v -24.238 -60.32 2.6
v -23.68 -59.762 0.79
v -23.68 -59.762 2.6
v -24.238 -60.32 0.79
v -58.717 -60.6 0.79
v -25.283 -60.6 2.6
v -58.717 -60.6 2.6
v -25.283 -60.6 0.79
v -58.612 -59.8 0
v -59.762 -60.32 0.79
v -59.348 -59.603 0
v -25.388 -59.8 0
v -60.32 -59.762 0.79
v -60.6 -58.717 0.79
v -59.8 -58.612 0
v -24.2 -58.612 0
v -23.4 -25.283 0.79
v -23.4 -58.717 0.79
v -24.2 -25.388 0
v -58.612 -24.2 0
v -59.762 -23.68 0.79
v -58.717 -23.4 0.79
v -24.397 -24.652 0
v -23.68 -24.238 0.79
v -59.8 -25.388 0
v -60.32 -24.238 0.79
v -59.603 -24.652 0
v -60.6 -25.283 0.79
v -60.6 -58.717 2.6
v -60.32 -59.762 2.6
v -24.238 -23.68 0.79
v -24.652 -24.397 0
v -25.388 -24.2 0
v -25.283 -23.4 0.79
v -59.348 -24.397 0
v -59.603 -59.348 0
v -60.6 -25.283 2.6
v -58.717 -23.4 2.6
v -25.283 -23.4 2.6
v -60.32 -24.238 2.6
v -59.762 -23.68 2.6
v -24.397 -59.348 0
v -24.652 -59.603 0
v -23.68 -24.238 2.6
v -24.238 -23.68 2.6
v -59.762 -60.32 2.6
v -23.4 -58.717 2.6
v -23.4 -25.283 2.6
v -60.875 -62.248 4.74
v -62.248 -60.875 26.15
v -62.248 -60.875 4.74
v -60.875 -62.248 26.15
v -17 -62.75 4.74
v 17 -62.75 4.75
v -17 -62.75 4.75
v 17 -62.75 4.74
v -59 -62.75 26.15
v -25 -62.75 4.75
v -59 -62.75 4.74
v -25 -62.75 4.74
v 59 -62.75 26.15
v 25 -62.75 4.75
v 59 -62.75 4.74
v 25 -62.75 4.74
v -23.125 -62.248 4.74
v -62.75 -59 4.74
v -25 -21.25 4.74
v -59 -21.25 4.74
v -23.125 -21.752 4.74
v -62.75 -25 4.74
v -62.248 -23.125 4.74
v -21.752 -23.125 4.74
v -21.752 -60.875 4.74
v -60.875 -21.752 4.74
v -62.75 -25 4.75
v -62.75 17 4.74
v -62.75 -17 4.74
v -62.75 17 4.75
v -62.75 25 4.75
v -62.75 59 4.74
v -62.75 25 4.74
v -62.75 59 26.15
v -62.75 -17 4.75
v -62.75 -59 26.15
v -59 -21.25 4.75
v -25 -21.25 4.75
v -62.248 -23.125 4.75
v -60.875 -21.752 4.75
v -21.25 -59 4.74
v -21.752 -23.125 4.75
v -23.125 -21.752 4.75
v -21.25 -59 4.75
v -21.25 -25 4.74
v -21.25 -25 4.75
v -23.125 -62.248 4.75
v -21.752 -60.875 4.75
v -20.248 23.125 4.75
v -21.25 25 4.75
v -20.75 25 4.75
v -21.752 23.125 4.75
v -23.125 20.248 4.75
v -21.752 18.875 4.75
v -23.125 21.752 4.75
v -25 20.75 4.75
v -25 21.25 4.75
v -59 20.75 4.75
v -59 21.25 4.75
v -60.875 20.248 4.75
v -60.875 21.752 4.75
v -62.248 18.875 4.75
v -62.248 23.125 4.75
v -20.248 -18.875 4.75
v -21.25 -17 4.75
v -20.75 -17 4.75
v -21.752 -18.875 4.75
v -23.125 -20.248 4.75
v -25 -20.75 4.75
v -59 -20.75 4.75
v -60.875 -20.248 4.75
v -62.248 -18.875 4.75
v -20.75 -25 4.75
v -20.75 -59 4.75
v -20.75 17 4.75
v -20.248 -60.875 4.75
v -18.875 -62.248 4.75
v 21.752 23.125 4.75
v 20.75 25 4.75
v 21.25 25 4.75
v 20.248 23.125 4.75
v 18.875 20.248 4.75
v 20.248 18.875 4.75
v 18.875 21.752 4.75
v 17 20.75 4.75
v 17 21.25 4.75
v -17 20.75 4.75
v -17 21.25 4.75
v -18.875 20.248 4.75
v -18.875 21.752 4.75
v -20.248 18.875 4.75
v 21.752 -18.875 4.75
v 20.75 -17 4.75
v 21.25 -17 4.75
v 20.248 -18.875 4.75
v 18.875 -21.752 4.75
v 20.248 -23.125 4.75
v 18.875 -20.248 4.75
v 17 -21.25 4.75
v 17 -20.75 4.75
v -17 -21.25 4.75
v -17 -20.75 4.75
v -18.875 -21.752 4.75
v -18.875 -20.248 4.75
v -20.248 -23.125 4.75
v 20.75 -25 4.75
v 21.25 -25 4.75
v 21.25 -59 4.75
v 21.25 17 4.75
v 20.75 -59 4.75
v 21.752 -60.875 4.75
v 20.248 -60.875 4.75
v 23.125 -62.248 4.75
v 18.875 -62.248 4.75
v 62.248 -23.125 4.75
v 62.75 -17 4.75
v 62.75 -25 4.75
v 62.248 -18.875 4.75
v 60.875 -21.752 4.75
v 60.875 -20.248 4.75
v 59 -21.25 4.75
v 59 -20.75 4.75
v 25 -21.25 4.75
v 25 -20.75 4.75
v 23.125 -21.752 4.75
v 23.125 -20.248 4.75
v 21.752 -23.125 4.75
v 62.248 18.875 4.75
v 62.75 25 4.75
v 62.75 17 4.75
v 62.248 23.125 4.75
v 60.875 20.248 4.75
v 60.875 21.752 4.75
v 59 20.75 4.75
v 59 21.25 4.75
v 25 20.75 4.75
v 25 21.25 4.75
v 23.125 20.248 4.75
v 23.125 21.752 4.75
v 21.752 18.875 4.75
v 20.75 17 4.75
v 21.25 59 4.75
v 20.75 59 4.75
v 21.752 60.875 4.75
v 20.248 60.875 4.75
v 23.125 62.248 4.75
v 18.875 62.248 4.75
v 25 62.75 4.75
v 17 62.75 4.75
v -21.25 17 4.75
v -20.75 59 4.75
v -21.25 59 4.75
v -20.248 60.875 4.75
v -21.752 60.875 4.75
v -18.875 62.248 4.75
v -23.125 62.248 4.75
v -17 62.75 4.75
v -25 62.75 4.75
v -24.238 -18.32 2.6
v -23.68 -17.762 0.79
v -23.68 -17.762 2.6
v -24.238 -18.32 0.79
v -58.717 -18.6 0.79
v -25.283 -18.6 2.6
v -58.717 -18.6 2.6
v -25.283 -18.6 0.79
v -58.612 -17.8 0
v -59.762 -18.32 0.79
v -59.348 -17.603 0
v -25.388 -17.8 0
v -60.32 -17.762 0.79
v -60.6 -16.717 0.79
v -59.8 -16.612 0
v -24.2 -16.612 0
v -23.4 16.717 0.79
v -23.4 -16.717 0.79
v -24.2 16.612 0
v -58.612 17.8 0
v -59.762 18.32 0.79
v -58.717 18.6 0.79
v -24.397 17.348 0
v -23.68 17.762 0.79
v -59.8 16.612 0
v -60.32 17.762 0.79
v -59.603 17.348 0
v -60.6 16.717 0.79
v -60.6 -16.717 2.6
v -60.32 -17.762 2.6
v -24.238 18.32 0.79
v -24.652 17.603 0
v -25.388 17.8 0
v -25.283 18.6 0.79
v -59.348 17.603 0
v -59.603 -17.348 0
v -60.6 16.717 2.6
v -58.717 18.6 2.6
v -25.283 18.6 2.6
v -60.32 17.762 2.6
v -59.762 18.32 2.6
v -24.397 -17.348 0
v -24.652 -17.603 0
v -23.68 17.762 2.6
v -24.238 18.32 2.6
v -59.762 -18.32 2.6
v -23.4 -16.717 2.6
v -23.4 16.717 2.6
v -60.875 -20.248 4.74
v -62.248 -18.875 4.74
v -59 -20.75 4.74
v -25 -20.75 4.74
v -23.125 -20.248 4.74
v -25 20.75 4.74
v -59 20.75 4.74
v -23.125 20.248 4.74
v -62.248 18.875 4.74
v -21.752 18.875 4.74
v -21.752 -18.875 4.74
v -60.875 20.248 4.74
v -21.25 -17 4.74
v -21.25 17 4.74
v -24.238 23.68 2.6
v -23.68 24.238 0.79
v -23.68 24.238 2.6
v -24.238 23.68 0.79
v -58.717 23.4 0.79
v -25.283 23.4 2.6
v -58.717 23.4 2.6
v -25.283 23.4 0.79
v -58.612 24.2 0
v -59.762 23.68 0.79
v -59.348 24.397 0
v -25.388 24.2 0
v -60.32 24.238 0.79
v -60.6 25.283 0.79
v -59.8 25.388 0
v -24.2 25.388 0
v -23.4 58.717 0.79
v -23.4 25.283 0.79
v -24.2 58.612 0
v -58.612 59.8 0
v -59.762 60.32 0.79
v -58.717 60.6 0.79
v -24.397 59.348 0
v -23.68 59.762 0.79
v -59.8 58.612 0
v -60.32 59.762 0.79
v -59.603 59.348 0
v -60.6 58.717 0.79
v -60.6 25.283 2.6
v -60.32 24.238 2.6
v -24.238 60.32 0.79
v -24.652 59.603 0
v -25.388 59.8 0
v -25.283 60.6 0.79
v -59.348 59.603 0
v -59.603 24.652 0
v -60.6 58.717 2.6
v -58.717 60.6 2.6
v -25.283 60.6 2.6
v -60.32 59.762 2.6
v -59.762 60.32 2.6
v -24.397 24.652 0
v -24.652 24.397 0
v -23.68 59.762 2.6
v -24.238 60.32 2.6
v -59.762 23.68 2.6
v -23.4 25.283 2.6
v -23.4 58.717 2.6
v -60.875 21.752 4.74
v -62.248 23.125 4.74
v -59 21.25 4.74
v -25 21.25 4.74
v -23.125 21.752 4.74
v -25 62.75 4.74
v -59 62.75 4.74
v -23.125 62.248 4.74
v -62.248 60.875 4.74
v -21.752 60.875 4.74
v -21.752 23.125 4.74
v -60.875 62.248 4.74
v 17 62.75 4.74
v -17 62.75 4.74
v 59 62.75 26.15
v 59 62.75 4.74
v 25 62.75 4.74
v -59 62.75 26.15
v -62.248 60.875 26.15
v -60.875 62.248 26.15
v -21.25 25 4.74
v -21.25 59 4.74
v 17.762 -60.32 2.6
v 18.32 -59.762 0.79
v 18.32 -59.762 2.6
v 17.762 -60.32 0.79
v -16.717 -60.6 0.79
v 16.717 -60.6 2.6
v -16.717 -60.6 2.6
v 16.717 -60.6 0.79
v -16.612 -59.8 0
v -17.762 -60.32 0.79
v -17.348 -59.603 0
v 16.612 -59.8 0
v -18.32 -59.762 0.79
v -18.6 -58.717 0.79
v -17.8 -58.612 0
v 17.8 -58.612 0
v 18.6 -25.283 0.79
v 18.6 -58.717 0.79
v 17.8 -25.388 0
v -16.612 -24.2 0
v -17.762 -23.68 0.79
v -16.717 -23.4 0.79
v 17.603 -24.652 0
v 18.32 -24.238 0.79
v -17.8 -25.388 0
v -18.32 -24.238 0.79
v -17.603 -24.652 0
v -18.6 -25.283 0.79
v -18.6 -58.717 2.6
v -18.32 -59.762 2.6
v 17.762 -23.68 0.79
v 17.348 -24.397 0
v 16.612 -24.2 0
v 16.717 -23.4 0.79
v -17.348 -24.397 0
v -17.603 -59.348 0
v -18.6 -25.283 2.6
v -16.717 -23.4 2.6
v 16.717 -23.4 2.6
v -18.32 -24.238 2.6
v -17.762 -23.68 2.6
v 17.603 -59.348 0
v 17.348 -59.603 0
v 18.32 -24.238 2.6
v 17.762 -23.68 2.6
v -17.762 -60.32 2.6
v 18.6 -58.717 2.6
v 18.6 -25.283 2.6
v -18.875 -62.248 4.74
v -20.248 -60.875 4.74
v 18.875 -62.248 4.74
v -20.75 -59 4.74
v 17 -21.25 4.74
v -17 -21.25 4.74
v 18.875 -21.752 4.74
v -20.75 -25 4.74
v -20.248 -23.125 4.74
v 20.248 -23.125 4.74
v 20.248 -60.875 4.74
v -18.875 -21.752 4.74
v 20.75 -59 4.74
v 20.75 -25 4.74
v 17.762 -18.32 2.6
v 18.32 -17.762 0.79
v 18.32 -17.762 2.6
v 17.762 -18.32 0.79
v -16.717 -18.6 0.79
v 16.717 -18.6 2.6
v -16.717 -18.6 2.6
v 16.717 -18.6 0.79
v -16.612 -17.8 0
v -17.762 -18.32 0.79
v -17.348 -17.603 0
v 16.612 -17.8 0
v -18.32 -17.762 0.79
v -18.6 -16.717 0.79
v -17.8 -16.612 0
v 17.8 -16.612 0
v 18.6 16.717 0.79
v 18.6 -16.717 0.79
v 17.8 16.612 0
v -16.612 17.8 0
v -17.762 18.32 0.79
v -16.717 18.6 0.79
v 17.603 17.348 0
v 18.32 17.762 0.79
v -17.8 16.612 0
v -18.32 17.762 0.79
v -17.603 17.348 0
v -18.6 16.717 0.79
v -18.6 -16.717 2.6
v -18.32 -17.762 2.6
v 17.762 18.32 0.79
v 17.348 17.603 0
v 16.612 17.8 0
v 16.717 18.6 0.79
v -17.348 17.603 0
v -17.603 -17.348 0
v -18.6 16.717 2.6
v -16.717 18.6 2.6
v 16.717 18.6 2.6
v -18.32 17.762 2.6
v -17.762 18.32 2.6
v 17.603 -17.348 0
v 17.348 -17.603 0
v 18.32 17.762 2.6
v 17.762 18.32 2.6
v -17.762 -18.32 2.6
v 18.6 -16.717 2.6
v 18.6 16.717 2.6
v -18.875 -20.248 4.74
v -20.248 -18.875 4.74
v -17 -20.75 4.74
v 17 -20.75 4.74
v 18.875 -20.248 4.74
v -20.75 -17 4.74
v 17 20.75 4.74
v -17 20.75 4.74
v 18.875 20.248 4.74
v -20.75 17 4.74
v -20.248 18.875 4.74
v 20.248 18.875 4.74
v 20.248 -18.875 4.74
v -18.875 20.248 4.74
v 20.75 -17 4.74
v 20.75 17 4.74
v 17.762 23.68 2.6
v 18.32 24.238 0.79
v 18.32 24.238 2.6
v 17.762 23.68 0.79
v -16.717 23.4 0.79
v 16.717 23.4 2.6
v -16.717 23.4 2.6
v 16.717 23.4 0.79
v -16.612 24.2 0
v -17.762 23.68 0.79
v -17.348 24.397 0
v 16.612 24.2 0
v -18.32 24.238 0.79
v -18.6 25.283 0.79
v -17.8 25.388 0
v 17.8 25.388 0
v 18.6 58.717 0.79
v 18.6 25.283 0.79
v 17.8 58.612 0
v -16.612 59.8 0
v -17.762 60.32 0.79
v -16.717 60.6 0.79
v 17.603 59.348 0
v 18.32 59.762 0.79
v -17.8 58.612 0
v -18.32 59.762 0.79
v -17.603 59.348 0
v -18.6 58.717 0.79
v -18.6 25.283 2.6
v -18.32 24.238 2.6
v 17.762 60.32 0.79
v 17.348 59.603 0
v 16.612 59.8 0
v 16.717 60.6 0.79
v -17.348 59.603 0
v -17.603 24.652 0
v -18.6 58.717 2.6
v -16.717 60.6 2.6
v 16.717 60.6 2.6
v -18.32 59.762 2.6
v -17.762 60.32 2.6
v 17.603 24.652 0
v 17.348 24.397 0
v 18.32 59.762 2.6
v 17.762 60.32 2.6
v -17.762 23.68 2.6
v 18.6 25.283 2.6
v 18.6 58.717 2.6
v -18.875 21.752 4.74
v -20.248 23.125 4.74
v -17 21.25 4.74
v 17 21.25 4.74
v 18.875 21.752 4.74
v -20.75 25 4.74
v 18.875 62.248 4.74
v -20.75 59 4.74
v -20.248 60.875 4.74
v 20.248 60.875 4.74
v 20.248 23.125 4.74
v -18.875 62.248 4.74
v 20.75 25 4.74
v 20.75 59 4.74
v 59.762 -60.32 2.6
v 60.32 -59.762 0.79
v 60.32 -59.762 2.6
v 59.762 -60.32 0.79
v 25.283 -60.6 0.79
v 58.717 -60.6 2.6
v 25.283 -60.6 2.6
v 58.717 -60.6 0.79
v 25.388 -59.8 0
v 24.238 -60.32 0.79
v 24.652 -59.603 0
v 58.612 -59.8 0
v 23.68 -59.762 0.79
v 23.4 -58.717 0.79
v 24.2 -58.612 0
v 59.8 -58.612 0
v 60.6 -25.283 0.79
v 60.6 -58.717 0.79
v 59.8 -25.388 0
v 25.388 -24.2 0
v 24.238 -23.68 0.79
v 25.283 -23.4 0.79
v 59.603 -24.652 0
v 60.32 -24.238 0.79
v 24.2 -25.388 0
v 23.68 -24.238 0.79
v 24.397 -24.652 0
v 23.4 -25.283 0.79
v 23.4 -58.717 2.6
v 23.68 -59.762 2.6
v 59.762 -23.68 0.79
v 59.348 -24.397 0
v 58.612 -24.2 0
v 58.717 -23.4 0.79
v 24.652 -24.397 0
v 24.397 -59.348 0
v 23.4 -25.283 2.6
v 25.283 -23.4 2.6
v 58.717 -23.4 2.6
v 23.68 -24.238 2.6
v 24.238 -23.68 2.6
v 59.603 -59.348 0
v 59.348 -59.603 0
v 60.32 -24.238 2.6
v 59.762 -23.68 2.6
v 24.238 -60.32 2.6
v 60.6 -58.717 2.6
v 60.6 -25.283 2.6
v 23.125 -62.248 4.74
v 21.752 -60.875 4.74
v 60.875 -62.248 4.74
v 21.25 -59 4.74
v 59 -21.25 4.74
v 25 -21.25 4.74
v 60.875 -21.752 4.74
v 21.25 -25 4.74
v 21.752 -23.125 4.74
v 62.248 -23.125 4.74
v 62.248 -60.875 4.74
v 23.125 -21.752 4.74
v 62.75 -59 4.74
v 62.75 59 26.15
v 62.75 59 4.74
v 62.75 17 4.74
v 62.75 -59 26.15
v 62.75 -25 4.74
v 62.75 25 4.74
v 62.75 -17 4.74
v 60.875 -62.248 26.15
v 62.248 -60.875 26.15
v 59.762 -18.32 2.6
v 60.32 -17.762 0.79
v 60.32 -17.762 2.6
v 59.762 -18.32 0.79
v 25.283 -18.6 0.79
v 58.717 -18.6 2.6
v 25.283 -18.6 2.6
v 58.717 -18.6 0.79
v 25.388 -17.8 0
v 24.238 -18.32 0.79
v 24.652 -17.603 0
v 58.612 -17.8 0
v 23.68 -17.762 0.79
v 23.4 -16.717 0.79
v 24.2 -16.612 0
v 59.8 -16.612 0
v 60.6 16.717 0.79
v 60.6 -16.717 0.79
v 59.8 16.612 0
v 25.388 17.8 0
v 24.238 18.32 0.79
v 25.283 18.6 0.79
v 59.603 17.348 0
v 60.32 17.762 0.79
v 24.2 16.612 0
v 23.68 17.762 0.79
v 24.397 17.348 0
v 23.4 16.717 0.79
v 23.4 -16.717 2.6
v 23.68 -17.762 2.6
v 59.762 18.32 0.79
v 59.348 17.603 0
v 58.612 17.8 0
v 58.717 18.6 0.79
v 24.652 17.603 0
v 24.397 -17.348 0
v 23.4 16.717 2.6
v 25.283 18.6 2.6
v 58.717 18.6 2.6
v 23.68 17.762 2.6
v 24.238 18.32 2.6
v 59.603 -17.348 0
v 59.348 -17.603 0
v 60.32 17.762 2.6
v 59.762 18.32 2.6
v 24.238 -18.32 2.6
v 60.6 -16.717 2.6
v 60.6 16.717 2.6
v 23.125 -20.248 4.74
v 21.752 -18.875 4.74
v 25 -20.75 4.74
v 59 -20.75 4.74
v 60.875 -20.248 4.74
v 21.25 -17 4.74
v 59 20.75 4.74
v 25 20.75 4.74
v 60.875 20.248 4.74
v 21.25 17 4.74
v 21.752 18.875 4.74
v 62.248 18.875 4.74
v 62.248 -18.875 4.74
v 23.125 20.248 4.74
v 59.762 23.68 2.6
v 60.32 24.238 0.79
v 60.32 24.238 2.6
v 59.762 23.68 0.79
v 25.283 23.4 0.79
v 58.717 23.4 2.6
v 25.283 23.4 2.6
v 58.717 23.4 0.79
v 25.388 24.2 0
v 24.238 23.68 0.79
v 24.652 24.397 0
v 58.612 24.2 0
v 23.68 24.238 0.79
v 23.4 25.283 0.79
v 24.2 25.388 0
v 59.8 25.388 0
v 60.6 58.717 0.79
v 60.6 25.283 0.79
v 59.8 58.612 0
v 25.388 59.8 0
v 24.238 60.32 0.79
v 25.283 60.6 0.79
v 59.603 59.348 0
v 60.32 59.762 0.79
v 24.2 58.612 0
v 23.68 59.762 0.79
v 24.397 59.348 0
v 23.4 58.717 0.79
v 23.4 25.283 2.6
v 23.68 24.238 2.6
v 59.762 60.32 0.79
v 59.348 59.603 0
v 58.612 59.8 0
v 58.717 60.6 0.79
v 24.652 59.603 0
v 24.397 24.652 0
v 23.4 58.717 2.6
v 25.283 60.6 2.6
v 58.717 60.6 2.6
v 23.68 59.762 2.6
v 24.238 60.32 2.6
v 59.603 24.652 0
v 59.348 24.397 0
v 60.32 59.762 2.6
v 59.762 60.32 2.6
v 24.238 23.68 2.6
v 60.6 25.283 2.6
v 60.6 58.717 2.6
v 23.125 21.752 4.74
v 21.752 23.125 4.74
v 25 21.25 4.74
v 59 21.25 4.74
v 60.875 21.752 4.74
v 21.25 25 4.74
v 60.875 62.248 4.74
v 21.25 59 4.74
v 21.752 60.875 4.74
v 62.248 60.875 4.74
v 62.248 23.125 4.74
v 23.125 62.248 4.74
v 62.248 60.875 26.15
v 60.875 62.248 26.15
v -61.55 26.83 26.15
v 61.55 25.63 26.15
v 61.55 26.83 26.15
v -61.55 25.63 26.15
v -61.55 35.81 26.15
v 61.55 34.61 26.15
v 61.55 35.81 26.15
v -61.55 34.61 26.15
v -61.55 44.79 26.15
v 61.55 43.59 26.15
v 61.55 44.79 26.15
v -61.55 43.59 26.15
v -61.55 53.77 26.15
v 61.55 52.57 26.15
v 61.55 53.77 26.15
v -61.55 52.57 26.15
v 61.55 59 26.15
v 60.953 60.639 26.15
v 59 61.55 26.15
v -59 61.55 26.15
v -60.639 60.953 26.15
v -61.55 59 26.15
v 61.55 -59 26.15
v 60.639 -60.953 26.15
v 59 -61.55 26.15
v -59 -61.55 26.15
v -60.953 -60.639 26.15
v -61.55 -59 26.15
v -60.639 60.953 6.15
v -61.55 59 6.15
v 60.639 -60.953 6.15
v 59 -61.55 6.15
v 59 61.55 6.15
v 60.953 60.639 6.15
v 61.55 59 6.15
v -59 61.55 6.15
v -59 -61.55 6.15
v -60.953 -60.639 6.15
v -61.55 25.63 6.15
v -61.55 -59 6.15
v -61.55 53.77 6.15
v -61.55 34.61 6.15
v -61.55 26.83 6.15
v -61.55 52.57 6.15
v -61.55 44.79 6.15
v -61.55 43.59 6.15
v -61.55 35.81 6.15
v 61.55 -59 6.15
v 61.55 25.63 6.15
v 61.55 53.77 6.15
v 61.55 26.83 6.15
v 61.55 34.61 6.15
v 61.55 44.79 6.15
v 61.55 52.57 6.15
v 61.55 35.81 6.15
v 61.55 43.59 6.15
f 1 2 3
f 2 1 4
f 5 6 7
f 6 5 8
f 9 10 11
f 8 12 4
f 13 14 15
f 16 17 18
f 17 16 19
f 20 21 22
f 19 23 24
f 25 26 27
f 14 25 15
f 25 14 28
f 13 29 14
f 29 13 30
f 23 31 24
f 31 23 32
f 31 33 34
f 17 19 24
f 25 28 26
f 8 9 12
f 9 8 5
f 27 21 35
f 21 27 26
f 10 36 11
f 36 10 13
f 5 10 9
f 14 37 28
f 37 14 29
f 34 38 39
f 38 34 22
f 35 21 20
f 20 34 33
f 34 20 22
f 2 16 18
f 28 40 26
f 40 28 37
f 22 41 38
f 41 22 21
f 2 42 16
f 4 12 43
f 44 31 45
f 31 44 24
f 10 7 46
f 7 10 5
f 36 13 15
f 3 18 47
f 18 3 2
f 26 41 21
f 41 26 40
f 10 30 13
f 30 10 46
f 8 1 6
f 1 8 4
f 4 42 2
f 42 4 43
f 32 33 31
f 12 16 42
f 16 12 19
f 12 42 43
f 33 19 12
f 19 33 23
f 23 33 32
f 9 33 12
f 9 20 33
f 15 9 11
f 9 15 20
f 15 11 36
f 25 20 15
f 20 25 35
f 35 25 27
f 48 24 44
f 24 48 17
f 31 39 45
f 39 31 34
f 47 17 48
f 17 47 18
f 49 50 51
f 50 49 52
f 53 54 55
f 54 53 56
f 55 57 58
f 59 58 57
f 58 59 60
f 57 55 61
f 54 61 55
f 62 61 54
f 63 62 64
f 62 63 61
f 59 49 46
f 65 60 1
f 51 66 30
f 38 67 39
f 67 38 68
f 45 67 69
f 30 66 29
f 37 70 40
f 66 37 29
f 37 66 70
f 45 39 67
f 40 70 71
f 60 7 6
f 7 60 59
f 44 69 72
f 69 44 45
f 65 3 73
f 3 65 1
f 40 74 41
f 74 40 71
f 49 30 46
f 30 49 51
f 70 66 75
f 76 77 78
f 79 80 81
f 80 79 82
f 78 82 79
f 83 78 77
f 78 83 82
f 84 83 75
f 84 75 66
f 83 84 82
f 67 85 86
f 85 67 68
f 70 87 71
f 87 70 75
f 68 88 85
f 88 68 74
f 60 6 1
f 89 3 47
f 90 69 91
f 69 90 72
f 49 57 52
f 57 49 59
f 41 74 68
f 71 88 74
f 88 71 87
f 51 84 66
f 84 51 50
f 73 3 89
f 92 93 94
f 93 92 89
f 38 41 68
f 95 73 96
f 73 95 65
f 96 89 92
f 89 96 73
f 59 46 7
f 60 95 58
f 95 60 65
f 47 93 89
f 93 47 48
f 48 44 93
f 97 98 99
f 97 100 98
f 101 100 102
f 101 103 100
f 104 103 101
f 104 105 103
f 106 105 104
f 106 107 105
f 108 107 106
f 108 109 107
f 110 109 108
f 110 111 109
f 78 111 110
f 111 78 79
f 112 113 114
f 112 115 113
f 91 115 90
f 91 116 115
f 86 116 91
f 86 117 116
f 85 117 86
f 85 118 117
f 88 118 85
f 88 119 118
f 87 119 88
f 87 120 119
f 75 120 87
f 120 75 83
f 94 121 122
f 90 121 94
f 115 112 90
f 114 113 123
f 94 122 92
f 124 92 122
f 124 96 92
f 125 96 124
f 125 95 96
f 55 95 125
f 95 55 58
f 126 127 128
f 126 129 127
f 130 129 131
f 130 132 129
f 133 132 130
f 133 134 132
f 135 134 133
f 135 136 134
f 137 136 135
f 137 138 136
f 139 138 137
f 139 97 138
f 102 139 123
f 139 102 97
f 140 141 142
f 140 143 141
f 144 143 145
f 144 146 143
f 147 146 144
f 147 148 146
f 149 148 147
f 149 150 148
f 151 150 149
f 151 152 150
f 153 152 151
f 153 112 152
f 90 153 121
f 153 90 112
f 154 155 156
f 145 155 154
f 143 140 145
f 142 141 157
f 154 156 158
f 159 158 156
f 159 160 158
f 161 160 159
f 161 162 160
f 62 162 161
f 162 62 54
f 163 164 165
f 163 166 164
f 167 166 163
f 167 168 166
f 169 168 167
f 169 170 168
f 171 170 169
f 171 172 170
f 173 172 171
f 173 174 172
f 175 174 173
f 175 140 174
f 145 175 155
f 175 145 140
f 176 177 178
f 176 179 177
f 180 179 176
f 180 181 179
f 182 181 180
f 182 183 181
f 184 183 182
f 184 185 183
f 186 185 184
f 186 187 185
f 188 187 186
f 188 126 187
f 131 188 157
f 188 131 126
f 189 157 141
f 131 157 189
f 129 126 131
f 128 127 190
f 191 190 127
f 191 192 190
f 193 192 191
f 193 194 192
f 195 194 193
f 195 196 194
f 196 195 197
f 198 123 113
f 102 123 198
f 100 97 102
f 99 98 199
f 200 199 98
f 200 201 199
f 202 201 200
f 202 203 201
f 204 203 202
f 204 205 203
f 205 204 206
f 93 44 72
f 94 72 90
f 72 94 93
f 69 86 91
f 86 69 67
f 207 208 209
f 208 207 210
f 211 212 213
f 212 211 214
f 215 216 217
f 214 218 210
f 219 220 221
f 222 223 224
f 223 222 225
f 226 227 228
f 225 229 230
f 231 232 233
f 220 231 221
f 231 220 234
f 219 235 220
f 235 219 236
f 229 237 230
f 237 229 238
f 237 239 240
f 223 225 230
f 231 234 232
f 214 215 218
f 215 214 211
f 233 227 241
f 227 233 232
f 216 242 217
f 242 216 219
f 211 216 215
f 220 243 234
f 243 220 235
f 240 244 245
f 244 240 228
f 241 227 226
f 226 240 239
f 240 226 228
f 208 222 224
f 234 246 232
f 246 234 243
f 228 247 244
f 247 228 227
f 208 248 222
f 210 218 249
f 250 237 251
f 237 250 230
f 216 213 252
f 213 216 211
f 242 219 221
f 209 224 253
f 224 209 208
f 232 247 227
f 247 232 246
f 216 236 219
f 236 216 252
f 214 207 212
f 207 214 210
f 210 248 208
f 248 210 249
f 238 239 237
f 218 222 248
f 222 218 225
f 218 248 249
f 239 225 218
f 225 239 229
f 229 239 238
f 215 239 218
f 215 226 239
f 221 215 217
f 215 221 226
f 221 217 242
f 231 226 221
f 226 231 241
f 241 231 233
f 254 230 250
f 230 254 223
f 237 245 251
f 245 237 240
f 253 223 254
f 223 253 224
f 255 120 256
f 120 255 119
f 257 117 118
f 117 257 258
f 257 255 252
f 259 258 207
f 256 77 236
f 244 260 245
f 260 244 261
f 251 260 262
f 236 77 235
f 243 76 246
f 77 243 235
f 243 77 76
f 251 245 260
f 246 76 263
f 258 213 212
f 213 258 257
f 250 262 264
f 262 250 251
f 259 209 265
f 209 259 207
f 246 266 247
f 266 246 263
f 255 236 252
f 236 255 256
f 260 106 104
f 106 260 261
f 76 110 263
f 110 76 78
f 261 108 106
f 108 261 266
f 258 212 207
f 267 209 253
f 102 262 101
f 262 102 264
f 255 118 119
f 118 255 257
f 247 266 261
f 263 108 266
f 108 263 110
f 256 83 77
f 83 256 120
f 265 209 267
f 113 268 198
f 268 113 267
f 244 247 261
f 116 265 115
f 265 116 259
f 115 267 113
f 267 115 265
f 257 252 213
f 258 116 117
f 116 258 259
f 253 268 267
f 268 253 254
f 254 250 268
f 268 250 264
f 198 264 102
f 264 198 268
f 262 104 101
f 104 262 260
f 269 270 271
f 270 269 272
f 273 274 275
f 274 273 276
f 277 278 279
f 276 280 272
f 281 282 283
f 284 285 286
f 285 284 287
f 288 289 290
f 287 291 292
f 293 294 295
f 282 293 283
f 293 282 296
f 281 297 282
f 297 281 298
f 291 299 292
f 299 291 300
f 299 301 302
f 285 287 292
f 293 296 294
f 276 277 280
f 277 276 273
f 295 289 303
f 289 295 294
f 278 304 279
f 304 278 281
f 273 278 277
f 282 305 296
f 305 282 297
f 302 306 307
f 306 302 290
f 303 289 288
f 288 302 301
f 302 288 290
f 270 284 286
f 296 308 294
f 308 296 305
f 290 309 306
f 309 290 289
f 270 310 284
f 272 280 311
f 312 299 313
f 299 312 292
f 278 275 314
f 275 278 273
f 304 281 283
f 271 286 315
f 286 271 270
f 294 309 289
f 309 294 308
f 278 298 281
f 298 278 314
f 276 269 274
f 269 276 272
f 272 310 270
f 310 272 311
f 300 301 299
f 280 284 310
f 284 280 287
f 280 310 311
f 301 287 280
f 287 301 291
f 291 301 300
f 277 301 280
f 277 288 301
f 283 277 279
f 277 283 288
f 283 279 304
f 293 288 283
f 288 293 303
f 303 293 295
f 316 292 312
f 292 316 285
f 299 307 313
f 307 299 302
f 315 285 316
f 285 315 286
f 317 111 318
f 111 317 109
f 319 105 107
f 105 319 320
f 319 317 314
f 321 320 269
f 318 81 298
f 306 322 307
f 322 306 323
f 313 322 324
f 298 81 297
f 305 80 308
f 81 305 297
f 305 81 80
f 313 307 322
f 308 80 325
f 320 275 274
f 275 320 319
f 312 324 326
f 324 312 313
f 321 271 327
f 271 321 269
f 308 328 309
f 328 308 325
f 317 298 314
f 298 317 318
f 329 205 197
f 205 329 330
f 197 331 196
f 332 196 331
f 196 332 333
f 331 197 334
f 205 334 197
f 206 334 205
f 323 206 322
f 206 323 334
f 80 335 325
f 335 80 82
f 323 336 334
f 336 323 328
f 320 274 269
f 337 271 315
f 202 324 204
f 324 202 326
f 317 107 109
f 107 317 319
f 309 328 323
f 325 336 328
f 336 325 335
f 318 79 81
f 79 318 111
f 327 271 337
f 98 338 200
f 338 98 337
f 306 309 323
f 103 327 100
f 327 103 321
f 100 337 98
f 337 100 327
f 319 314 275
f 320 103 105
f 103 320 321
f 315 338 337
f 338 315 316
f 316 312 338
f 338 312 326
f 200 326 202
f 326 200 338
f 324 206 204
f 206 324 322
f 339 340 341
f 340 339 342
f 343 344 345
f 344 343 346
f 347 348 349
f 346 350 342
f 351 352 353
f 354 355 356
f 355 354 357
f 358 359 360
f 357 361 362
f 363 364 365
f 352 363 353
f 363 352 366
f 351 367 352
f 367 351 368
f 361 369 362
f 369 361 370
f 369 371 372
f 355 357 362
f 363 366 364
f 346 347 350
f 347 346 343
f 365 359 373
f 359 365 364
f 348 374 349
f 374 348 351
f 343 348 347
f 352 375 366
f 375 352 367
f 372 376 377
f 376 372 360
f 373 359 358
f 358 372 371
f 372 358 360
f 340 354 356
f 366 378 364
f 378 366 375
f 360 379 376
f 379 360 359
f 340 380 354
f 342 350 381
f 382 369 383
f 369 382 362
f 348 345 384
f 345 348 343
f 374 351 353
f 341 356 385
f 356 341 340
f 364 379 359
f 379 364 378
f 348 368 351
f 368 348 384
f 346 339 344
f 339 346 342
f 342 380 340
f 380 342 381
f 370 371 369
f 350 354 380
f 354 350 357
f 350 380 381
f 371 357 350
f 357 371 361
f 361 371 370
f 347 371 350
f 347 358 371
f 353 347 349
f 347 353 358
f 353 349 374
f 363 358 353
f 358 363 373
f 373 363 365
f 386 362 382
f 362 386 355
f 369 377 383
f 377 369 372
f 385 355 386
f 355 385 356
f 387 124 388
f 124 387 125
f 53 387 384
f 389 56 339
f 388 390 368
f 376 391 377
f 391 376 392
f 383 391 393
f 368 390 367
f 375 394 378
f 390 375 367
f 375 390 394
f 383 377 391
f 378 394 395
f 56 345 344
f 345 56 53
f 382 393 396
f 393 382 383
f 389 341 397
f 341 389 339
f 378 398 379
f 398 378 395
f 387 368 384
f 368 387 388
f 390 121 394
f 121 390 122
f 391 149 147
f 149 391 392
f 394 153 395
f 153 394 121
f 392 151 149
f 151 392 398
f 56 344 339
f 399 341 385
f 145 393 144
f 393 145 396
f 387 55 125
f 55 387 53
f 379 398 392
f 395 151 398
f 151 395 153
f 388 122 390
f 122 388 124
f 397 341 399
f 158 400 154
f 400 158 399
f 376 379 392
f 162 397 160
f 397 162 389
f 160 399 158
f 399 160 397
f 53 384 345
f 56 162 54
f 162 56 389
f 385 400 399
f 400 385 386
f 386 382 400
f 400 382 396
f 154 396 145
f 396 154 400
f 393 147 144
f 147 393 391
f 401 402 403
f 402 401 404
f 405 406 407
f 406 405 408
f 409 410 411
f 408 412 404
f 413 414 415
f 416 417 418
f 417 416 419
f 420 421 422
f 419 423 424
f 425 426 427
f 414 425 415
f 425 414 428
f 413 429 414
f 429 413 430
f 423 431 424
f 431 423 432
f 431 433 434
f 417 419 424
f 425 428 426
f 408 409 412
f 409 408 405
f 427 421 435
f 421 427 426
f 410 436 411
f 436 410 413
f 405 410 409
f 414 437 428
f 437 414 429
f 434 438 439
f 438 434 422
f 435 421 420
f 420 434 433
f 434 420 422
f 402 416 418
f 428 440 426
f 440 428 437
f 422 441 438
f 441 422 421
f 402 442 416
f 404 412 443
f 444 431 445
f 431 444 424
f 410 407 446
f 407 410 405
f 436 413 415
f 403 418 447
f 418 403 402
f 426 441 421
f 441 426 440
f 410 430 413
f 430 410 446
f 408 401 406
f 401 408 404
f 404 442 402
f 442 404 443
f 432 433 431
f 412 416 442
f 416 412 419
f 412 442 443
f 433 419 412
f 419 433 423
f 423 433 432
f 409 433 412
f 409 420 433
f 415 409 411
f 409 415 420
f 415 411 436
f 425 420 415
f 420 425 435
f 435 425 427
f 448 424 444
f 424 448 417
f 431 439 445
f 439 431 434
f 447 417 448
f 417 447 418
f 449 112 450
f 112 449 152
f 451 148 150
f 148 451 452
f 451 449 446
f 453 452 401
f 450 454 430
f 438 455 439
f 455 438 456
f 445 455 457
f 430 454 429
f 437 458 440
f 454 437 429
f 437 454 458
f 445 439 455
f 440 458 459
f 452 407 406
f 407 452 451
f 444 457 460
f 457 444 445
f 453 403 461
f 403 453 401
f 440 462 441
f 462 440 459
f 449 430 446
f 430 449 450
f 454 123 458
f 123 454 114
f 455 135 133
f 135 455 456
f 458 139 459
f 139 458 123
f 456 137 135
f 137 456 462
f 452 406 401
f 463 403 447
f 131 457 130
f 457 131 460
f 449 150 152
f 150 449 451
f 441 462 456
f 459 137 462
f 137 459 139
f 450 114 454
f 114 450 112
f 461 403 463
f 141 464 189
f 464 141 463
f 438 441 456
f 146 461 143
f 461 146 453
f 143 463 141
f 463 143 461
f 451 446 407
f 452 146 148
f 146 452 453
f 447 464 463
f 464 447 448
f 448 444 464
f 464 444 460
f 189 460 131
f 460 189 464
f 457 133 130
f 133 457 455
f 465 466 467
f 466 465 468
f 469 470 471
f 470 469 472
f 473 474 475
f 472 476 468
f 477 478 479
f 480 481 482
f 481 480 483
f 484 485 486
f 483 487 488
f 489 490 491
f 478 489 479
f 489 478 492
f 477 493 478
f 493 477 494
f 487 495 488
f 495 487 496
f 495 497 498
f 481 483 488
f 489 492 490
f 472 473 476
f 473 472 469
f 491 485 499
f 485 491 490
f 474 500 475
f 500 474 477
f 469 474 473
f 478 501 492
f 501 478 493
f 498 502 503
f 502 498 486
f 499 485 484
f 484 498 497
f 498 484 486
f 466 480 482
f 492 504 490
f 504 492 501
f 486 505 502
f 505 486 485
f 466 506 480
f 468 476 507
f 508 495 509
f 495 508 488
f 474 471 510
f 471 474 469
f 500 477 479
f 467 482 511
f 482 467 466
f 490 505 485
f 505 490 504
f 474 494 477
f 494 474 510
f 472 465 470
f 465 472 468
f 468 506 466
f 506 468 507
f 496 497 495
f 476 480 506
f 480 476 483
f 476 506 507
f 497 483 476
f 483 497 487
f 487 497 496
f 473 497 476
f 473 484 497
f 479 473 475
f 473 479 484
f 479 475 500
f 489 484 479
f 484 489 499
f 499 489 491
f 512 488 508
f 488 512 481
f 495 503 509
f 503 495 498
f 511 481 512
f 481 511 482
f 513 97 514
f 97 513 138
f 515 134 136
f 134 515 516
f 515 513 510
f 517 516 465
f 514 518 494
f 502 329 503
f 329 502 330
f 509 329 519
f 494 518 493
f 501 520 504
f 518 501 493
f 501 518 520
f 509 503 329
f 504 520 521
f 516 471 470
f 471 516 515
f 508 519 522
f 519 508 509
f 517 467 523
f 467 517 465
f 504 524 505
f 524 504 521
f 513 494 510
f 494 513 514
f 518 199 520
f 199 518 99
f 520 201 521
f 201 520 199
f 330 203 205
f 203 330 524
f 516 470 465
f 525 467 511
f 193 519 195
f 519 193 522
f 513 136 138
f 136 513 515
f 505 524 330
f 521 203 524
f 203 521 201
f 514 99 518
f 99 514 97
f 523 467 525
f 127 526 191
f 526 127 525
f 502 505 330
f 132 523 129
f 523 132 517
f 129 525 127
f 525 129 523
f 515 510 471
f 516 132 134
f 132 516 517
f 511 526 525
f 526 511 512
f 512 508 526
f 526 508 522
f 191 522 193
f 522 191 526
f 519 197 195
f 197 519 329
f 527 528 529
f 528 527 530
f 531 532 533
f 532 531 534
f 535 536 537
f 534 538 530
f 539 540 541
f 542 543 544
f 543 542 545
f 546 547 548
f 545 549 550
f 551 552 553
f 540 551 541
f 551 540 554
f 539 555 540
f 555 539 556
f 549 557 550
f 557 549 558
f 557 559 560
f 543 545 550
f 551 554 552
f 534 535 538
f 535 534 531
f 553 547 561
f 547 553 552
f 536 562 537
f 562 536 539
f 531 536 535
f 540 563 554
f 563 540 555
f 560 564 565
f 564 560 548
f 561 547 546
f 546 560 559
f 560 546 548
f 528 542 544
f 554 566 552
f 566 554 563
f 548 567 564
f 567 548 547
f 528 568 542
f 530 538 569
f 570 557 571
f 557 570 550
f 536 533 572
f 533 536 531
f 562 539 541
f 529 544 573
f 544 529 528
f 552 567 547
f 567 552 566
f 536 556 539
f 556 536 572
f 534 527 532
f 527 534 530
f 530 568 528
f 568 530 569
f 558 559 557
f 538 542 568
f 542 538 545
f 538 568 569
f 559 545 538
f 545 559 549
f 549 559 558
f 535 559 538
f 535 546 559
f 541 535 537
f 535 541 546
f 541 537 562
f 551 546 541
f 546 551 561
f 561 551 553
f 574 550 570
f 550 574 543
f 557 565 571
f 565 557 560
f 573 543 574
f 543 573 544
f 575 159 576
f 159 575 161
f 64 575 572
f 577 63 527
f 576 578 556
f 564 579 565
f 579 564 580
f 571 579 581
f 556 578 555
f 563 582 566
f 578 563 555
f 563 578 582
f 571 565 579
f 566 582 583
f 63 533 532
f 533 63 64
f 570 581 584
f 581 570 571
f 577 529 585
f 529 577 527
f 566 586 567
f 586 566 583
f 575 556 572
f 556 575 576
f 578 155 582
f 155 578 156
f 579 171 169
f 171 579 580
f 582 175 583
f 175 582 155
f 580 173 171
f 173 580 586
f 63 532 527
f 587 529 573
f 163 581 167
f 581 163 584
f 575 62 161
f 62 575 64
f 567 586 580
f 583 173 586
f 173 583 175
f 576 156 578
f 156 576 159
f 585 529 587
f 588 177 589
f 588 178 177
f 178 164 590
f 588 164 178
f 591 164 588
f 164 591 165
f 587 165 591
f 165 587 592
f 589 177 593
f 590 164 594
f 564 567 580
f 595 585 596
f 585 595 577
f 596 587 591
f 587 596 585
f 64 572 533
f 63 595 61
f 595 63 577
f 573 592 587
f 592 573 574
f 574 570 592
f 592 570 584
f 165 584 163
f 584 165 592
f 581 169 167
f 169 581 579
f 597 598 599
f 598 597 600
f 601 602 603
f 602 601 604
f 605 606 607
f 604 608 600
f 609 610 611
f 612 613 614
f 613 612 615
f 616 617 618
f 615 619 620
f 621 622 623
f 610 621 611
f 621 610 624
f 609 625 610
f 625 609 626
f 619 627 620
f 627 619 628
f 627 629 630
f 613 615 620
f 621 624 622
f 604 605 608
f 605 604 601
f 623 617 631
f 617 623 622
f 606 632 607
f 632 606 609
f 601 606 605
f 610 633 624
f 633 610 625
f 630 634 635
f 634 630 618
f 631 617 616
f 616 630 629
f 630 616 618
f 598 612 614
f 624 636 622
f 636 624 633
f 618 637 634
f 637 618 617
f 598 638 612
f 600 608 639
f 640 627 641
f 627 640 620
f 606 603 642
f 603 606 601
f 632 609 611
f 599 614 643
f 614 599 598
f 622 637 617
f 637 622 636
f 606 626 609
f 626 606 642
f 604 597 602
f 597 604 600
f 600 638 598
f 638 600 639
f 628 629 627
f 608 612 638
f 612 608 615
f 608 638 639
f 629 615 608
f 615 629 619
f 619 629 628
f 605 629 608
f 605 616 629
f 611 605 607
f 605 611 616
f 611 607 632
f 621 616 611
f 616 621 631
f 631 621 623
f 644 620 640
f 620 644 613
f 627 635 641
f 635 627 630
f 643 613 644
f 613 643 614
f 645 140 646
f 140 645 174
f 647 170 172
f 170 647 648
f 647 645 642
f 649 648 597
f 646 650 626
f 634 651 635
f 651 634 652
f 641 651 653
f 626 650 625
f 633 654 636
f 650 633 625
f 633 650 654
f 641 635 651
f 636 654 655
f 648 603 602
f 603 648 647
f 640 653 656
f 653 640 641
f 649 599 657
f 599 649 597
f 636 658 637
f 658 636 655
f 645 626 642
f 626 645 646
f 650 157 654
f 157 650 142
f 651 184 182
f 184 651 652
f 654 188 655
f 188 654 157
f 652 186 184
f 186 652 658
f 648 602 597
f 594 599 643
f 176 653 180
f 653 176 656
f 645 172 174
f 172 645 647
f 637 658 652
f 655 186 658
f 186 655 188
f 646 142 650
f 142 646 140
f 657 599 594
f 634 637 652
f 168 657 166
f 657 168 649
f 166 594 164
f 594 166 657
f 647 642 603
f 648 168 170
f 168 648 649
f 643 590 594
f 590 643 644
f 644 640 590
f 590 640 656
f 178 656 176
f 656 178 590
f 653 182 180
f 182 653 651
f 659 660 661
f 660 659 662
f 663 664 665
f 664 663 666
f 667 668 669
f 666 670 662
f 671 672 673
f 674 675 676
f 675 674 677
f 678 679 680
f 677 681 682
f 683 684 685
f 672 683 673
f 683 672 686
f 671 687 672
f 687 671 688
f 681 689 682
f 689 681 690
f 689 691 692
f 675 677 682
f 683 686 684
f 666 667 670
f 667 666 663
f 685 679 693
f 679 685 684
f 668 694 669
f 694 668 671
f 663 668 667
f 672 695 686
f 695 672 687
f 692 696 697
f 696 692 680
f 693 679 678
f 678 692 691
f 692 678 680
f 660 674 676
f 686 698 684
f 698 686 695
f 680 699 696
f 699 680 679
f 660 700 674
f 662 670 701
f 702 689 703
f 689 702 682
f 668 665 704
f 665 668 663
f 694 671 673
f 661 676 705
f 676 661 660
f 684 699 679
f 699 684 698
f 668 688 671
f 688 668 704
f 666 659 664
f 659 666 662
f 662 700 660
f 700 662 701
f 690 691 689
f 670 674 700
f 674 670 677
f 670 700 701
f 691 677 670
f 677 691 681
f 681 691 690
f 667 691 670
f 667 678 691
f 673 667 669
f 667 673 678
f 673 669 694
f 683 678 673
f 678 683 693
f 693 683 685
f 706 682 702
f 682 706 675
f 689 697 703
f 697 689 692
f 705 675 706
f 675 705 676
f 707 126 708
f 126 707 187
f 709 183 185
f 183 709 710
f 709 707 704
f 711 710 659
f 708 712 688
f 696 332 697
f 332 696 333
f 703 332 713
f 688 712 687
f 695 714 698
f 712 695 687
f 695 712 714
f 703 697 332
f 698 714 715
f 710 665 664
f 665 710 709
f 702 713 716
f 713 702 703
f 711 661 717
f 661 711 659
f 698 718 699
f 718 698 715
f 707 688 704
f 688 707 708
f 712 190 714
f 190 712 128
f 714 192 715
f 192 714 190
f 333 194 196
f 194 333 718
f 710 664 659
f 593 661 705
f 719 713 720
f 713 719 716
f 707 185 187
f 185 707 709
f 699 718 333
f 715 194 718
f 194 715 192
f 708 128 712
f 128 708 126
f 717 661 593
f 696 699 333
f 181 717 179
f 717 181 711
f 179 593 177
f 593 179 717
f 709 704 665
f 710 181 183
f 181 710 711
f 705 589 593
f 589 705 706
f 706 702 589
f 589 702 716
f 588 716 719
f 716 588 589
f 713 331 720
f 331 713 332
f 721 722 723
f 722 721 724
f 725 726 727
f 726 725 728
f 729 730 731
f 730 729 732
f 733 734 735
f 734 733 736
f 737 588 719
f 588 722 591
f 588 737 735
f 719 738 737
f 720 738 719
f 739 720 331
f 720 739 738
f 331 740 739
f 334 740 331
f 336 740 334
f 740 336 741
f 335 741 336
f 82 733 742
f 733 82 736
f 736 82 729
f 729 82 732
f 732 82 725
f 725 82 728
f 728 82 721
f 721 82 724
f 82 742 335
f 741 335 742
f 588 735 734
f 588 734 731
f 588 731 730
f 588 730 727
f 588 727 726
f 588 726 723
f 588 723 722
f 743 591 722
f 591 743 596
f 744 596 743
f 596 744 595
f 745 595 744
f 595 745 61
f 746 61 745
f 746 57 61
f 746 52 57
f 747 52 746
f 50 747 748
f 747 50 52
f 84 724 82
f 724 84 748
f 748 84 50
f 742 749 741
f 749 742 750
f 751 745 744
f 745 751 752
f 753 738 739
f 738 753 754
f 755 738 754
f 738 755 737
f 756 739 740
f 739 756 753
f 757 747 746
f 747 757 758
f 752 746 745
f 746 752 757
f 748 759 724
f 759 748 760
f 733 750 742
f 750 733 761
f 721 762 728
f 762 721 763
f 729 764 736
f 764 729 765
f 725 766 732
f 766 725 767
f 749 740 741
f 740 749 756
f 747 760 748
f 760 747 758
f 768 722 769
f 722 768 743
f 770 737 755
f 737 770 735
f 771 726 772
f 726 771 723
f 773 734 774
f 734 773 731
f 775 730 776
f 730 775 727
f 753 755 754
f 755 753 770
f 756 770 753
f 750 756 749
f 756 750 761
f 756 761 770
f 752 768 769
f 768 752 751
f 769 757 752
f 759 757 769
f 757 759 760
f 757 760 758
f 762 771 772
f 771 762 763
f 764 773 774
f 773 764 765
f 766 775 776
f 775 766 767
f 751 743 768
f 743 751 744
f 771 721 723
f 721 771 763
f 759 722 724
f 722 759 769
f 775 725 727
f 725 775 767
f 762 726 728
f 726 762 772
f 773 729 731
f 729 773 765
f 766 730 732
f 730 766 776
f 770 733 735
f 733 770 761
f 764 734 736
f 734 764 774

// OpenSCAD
// bin_bga_rack — 3×3 bin: the AMAOE reballing jig lying flat, plus four slots
// for the stencil bags standing on end.
//
// The jig is 85.17 × 85.18 × 15 and LIES FLAT — at 20 mm deep it just drops in.
// The stencils (largest 50 × 50) STAND ON END in narrow slots and deliberately
// stand proud of the rim: a slot's job is to hold them upright and sorted, not
// to swallow them. Burying a 50 mm stencil would need a 56 mm bin for no gain.
//
// WHY 3×3. The jig is 85.18 across, which does not fit a 3×2's 81.1 mm interior.
// 3×3 gives 123.1 square — the jig compartment takes 87.2 and the remaining
// ~31 mm carries the stencil slots.
//
// FOUR slots because there are four bags, sorted by ball size. One bag per slot
// keeps that sorting rather than pooling them.
//
// PRINT: as emitted, feet down. No supports.
include <../lib/gridfinity.scad>

/* [Contents] */
JIG_W     = 85.18;  // AMAOE jig across, measured (85.17 × 85.18, square enough)
JIG_CLR   = 2.0;    // [1:0.5:4] a rigid block dropping in, not a fit
N_STENCIL = 4;      // [2:1:6] one slot per bag

/* [Bin] */
NX = 3; NY = 3;
DEPTH  = 20;        // [10:1:60] usable depth — set by the 15 mm jig lying flat
WALL   = 1.2;
DIV    = 1.2;       // [1:0.2:3] divider thickness
FLOOR  = 1.4;

// AFTER FLOOR. OpenSCAD evaluates in file order, so a forward reference here
// silently yields undef — and the part still renders and still passes the mesh
// check, just at the wrong height.
RACK_H = BIN_BASE_H + FLOOR + DEPTH;

W  = NX*GF - 0.5;  D = NY*GF - 0.5;
IW = W - 2*WALL;   ID = D - 2*WALL;
Z0 = BIN_BASE_H + FLOOR;

JIG_BAY = JIG_W + JIG_CLR;
STENCIL_SLOT = (ID - JIG_BAY - N_STENCIL*DIV) / N_STENCIL;

assert(STENCIL_SLOT >= 4,
       str("Stencil slots collapse to ", STENCIL_SLOT, " mm — fewer slots, or 4×3."));
assert(JIG_BAY <= ID, "Jig bay is wider than the bin interior.");
echo(str("jig bay ", JIG_BAY, " x ", IW, " mm; ", N_STENCIL,
         " stencil slots of ", STENCIL_SLOT, " mm"));

// Dividers are ADDED to the shell, never cut from it — subtracting them slots
// the outer walls open instead of partitioning the inside, and that renders as a
// perfectly watertight mesh with the right bounding box.
union() {
    bin(NX, NY, RACK_H, wall = WALL, floor = FLOOR);
    for (i = [0 : N_STENCIL - 1])
        translate([-IW/2, -ID/2 + JIG_BAY + i*(STENCIL_SLOT + DIV), Z0])
            cube([IW, DIV, RACK_H - Z0]);
}
